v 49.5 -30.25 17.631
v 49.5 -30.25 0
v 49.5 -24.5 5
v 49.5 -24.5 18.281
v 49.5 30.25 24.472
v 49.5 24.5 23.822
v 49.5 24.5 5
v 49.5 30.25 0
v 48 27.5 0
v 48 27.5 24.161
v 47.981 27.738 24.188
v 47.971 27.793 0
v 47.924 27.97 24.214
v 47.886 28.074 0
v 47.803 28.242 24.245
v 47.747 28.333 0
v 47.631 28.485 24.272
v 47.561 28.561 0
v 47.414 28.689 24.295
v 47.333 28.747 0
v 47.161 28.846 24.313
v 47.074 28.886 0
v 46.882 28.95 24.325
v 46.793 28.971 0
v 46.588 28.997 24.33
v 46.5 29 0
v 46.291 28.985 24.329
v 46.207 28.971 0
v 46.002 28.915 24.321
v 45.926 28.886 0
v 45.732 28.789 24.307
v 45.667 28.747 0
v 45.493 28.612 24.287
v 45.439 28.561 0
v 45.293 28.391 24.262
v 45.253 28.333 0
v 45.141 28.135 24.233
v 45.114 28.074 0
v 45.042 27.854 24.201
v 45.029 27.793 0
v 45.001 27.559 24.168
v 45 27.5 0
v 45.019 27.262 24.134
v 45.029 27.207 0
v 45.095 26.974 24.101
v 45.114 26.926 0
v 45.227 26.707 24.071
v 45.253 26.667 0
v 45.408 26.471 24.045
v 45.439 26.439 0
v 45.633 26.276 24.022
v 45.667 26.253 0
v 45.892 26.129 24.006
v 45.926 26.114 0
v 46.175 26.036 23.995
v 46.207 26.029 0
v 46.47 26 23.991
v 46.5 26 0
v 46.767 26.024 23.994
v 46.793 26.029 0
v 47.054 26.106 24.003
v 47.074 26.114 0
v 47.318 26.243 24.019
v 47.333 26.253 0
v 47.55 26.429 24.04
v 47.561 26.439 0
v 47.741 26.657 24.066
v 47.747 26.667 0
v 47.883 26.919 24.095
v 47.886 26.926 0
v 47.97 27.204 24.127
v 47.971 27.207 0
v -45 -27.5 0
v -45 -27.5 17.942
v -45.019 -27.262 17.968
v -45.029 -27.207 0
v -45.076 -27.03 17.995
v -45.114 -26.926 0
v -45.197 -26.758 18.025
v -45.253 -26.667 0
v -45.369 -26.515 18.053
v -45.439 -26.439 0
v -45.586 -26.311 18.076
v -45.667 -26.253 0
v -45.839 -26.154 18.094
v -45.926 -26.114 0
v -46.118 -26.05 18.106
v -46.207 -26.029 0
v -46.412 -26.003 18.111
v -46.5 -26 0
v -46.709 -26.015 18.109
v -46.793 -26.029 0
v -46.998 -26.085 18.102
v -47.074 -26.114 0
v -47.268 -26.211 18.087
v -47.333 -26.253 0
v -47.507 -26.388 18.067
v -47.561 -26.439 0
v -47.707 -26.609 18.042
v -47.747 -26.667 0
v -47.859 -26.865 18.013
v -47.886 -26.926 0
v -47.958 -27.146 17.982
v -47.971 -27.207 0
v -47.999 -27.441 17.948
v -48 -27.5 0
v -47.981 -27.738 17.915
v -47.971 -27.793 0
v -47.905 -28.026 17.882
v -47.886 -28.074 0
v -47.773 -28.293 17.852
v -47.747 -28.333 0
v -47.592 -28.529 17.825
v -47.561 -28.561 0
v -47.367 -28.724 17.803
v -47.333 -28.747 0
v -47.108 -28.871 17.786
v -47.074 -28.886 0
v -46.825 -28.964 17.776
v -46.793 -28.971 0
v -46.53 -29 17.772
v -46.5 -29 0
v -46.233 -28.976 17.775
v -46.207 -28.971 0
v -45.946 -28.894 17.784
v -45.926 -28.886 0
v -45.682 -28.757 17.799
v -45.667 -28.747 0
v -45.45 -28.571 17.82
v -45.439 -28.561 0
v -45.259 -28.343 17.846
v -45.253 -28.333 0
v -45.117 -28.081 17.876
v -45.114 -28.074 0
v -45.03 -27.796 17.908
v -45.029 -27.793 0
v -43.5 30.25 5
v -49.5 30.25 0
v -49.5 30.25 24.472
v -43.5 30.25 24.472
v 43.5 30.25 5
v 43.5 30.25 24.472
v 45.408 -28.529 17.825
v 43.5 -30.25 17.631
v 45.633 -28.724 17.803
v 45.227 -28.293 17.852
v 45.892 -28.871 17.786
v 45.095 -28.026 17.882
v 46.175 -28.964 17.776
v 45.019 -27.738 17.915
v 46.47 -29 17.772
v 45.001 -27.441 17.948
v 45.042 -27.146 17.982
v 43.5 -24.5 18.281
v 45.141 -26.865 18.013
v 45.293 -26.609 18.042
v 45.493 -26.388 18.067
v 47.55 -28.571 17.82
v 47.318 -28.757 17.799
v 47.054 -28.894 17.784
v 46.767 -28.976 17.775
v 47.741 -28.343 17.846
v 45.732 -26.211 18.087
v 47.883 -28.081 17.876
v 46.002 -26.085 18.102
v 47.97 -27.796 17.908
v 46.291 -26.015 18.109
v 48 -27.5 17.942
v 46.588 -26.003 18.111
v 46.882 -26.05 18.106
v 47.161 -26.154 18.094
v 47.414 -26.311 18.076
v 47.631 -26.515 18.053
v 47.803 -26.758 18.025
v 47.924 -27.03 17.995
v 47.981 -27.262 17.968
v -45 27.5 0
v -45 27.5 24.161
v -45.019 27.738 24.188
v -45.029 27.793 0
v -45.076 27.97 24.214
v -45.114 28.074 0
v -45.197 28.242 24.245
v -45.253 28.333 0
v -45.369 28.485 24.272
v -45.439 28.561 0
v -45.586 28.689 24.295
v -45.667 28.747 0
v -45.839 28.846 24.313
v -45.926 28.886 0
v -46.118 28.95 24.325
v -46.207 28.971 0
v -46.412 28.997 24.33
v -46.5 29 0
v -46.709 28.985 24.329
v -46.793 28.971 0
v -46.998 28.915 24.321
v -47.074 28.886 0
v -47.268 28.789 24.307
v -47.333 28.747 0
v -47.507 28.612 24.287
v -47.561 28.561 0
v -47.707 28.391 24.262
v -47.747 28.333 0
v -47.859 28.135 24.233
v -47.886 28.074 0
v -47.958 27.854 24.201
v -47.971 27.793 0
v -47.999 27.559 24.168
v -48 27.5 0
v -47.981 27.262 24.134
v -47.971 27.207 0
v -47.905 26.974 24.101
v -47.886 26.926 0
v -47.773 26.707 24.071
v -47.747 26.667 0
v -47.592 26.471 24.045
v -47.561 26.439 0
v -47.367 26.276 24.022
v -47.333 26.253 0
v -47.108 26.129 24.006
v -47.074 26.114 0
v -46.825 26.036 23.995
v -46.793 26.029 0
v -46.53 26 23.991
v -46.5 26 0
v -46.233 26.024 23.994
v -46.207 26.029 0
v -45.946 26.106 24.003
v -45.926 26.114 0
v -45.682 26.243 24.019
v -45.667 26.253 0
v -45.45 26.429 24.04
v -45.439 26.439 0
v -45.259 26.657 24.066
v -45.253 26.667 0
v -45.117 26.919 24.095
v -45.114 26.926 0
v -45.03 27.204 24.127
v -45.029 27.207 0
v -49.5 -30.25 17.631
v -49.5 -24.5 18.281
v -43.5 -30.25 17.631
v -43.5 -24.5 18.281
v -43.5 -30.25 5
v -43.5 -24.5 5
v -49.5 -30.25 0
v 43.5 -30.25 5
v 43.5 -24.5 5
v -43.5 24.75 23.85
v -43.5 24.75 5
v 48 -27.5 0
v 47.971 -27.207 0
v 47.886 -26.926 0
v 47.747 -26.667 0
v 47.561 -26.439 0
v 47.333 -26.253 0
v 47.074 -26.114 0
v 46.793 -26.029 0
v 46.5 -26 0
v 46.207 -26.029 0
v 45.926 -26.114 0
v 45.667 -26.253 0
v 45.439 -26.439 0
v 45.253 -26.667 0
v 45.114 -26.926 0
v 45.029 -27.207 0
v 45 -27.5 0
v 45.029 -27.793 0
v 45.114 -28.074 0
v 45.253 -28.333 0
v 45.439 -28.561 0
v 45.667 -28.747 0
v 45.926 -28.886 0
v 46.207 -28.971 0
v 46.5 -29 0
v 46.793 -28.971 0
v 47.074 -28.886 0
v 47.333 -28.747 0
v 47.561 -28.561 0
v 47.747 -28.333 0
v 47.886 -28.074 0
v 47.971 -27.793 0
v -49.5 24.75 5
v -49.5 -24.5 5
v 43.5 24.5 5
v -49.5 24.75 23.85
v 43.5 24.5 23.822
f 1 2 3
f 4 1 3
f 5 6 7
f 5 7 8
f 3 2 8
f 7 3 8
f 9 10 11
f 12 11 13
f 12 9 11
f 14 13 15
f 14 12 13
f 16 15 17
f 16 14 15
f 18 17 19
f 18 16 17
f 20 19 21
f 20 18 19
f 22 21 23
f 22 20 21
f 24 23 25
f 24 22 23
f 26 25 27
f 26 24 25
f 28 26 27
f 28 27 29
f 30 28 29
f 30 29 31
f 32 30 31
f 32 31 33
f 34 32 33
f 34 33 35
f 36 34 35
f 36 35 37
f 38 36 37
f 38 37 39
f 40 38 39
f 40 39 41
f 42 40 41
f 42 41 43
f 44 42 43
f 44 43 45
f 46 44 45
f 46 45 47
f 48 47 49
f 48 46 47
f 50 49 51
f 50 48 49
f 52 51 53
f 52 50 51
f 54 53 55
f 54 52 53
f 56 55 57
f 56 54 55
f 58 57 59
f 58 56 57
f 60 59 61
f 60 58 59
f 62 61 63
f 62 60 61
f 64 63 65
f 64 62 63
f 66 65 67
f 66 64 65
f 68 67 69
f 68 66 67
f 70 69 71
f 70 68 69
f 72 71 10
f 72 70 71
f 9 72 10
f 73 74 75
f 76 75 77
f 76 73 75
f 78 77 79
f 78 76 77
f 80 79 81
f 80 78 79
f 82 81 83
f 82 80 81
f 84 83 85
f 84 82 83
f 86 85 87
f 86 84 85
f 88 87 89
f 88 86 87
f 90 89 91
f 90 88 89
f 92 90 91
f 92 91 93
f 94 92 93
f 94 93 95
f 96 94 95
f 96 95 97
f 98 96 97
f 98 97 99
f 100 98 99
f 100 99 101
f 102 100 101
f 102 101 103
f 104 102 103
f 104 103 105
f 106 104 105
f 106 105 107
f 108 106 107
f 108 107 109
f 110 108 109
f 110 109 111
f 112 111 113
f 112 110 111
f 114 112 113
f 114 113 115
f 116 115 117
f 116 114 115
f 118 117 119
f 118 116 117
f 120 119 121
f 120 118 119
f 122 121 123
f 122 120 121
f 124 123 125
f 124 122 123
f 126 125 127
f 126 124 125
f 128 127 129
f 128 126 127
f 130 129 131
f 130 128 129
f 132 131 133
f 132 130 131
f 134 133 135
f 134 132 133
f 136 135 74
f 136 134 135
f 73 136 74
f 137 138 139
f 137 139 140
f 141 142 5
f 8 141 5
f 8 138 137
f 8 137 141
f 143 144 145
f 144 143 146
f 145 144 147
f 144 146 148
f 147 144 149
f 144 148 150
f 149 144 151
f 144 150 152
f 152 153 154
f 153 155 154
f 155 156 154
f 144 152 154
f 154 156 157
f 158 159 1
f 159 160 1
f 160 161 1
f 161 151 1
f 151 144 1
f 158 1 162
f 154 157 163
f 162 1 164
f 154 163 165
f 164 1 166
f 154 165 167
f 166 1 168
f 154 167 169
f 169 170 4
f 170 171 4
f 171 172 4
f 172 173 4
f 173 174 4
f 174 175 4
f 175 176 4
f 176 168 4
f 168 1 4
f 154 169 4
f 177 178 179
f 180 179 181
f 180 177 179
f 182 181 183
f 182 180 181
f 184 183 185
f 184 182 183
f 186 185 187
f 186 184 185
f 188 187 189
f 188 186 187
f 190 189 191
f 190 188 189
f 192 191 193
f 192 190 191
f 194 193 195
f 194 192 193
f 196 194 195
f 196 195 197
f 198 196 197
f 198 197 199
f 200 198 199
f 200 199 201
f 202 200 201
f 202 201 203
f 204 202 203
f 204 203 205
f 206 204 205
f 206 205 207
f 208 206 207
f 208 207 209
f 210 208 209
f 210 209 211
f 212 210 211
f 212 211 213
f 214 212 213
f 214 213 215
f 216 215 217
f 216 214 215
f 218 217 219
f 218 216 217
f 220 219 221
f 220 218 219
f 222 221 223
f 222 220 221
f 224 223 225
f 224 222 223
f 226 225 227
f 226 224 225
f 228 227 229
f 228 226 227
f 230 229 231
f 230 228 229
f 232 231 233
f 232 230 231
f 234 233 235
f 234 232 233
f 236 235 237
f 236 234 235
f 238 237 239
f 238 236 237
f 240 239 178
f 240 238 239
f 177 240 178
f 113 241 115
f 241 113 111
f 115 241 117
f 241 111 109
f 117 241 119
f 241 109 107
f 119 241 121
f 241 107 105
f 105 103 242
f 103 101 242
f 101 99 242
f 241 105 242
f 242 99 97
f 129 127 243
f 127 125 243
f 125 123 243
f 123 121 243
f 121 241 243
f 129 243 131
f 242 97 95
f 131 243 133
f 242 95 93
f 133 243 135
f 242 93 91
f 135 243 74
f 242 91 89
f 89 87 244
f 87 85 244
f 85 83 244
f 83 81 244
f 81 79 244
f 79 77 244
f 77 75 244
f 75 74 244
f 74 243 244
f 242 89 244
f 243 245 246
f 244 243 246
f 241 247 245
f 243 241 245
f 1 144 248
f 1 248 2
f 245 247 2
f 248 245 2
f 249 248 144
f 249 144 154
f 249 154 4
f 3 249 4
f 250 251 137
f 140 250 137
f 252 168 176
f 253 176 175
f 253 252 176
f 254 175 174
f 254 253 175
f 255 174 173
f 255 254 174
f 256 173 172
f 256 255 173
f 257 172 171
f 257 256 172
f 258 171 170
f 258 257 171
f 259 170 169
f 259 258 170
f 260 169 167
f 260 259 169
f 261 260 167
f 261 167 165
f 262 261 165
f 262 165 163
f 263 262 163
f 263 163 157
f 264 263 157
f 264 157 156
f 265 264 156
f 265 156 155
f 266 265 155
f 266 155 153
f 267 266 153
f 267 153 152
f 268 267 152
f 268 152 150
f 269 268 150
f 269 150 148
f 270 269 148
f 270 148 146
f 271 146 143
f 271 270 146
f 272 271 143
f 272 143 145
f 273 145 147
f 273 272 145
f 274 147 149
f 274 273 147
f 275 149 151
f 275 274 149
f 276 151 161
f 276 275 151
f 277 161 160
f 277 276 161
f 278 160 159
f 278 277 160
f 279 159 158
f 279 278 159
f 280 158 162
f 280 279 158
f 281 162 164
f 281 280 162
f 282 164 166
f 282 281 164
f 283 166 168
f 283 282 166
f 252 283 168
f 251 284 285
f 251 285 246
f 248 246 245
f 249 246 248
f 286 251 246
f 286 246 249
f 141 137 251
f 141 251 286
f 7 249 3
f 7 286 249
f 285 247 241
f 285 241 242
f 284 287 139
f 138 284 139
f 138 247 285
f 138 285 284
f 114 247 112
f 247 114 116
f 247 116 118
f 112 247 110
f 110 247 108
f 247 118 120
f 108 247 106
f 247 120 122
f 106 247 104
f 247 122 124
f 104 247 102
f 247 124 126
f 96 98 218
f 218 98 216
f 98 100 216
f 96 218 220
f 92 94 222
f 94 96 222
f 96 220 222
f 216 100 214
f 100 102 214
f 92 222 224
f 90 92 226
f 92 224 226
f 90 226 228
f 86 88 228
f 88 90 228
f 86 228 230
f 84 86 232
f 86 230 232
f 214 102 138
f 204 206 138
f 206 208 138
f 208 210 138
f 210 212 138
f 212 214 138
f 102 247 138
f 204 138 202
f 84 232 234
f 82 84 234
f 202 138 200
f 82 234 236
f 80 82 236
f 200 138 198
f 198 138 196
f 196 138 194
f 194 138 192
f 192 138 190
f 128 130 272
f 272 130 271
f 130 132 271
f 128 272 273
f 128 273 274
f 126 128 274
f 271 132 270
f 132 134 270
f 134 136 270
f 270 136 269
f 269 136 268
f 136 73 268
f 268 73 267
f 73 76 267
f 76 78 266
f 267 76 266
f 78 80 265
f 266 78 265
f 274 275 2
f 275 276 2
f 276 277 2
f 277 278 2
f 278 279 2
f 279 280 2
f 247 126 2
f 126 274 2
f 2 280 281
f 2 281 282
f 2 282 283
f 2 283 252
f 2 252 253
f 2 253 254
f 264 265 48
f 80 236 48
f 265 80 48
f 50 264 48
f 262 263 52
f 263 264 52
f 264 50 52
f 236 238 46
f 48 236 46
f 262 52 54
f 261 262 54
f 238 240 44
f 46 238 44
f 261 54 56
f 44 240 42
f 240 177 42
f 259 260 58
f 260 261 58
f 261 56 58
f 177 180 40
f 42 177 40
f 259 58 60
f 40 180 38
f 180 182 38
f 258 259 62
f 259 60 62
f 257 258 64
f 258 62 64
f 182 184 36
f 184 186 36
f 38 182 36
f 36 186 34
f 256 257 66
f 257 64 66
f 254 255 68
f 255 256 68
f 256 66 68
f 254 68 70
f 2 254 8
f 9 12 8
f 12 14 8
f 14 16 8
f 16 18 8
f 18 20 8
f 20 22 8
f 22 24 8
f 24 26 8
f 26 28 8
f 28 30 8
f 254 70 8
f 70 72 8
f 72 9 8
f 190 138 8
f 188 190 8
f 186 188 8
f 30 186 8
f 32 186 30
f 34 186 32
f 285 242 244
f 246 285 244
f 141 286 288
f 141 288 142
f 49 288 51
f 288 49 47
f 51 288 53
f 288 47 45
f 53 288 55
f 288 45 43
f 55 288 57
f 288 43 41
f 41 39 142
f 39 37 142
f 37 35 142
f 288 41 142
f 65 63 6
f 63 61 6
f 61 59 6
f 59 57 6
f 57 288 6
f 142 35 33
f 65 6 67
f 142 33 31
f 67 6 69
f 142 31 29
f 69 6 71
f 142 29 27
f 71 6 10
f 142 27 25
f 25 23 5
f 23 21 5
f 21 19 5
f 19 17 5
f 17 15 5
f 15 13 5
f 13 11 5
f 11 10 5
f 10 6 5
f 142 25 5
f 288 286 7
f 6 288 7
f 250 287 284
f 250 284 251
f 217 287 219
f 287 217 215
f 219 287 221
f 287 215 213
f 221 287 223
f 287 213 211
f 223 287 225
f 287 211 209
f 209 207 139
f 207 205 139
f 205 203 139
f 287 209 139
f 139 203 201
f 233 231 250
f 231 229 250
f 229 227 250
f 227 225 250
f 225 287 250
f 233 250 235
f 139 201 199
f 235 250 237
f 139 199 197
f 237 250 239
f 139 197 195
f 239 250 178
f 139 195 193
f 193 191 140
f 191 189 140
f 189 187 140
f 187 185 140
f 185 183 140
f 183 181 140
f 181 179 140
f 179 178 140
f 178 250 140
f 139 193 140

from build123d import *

# Parameters (mm, degrees)
F1_DEPTH = 5
F0_W     = 6
F0_H     = 5.5
F0_R     = 1.5
F0_H_2   = 5.75
F2_DEPTH = 25
F4_DEPTH = 105


with BuildPart() as f1:
    # F0 (on Top) → F1 (new body)
    with BuildSketch(Plane.XY):
        Polygon((43.5, 30.25), (-43.5, 30.25), (-43.5, 24.75), (-49.5, 24.75), (-49.5, -24.5), (-43.5, -24.5), (-43.5, -30.25), (43.5, -30.25), (43.5, -24.5), (49.5, -24.5), (49.5, 24.5), (43.5, 24.5), align=None)
    extrude(amount=F1_DEPTH)

    # F0 (on Top) → F2 (join)
    with BuildSketch(Plane.XY):
        with Locations((-46.5, 27.5)):
            Rectangle(F0_W, F0_H)
        with Locations((-46.5, 27.5)):
            Circle(F0_R, mode=Mode.SUBTRACT)
        with Locations((-46.5, -27.375)):
            Rectangle(F0_W, F0_H_2)
        with Locations((-46.5, -27.5)):
            Circle(F0_R, mode=Mode.SUBTRACT)
        with Locations((46.5, -27.375)):
            Rectangle(F0_W, F0_H_2)
        with Locations((46.5, -27.5)):
            Circle(F0_R, mode=Mode.SUBTRACT)
        with Locations((46.5, 27.375)):
            Rectangle(F0_W, F0_H_2)
        with Locations((46.5, 27.5)):
            Circle(F0_R, mode=Mode.SUBTRACT)
    extrude(amount=F2_DEPTH)

    # F3 (on face) → F4 (cut)
    with BuildSketch(Plane.YZ.offset(49.5)):
        Polygon((34.920923, 25), (34.537785, 31.615168), (-33.879854, 31.615168), (-33.879854, 17.220095), align=None)
    extrude(amount=-F4_DEPTH, mode=Mode.SUBTRACT)


solid = f1.part
